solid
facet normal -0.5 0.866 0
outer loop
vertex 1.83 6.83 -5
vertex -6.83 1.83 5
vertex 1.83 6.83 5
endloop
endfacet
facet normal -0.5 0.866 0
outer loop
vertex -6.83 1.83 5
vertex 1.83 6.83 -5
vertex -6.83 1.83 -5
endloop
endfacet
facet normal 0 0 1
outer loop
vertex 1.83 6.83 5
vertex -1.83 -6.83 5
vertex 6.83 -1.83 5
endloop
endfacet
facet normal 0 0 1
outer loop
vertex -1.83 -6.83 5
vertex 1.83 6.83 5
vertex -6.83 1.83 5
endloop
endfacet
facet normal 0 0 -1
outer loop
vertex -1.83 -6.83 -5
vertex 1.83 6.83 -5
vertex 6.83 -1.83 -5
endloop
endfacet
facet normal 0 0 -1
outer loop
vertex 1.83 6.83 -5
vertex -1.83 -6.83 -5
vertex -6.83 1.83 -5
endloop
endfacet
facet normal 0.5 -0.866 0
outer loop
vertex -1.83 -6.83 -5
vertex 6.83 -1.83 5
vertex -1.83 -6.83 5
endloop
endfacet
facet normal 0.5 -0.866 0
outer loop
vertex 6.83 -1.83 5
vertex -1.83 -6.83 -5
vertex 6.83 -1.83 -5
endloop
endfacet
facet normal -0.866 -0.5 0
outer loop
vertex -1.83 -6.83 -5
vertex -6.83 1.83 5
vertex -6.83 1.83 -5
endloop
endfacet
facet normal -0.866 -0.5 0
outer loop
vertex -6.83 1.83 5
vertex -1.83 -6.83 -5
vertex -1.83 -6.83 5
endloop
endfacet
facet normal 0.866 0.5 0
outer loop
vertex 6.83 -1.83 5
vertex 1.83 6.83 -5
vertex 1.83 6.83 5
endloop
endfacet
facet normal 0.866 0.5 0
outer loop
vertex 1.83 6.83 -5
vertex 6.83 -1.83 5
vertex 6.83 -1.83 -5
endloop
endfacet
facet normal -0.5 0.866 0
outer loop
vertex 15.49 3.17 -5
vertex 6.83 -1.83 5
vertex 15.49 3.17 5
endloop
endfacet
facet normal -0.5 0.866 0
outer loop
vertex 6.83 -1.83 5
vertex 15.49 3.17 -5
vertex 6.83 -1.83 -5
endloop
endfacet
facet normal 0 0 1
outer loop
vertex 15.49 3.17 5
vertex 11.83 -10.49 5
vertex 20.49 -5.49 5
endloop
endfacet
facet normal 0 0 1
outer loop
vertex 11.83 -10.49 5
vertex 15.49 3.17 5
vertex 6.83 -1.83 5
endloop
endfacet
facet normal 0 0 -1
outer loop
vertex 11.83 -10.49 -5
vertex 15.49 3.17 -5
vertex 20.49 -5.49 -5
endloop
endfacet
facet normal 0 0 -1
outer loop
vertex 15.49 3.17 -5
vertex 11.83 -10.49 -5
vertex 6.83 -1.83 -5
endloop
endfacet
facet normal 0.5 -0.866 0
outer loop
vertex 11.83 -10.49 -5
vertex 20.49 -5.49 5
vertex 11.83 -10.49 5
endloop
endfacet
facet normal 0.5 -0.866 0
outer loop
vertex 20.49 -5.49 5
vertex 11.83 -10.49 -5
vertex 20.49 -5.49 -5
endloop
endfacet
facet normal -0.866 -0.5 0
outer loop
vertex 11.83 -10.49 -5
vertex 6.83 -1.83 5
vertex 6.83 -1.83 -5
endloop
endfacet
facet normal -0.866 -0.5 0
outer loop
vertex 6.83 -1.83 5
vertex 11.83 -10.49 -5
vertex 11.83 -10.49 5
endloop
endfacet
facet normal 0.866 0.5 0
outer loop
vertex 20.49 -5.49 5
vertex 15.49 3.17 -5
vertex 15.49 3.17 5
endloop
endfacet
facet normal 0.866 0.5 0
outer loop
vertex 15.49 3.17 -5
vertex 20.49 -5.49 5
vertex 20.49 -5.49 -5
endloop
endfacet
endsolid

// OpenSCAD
rotate([0,0,90])
difference() {
    rotate([0,0,+30]) {
        cube(10, center=true);
        translate([-10,-10,0])
            cube(10, center=true);
    }
}
